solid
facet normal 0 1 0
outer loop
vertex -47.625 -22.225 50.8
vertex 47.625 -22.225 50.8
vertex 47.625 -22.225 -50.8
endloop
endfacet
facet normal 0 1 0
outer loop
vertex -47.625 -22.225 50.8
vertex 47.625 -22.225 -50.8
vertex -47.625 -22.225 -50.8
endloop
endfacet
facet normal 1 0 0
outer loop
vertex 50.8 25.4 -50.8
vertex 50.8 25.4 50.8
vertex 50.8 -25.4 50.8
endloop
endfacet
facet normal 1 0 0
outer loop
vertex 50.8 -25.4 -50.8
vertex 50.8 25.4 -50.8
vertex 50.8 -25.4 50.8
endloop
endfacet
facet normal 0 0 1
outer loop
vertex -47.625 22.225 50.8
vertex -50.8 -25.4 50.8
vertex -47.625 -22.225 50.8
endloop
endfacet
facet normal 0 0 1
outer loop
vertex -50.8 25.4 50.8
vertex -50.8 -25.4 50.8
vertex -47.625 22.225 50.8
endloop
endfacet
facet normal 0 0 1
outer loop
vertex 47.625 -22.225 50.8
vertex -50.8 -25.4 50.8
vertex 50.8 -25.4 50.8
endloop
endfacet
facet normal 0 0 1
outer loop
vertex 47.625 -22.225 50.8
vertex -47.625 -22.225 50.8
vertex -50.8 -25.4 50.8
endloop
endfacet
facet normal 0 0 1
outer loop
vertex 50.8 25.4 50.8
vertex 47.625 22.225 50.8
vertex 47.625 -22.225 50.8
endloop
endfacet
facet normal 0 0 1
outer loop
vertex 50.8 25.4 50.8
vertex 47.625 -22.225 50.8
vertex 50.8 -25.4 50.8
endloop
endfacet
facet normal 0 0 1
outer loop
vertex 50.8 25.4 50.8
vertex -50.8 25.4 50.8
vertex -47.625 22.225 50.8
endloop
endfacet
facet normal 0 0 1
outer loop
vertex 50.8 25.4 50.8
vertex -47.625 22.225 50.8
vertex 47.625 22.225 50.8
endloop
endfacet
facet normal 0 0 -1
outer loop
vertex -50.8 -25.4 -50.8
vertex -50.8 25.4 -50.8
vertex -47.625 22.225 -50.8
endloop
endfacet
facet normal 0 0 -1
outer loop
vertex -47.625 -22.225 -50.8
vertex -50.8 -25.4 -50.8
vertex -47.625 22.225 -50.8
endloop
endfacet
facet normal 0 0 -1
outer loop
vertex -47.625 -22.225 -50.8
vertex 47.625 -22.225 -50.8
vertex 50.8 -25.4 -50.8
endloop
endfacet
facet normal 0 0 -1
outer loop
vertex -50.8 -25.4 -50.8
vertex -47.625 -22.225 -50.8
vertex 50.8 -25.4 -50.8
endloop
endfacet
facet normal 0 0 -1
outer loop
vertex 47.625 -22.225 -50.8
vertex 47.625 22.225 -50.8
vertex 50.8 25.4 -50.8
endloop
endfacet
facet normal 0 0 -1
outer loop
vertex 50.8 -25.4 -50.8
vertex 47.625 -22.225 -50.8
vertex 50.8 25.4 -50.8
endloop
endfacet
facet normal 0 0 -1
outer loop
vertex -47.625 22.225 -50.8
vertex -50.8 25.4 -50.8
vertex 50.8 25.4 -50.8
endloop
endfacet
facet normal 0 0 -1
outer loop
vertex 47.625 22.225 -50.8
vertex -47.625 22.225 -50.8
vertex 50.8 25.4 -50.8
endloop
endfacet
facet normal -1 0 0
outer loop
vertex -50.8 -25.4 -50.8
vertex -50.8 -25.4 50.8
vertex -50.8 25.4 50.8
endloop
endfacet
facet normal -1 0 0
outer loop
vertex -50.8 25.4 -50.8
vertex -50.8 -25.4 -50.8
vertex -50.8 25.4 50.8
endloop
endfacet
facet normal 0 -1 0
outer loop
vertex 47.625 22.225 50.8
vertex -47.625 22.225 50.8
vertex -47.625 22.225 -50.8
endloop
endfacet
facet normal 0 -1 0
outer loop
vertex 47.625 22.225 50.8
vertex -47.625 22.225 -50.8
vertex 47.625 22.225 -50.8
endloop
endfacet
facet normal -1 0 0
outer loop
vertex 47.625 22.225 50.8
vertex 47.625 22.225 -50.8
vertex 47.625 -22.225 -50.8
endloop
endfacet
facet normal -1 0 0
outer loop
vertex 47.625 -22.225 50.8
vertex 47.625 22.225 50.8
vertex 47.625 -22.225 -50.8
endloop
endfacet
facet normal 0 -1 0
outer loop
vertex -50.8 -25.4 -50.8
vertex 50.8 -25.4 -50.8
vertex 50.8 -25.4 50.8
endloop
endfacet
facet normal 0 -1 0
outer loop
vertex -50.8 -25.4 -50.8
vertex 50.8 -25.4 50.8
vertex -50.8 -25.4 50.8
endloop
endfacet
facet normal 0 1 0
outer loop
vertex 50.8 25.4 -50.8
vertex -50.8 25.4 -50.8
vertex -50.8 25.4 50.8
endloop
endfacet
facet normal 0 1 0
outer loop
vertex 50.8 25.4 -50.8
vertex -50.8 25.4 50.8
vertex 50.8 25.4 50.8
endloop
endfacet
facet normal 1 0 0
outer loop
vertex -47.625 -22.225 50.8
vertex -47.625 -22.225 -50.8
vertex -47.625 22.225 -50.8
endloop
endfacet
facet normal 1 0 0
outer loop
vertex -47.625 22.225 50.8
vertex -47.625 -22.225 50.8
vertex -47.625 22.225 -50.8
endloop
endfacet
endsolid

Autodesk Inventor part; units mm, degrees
ref_plane "YZ Plane" through (0, 0, 0) normal (1, 0, 0) x (0, 1, 0)
ref_plane "XZ Plane" through (0, 0, 0) normal (0, 1, 0) x (-1, 0, 0)
ref_plane "XY Plane" through (0, 0, 0) normal (0, 0, 1) x (1, 0, 0)
sketch "Sketch1" plane through (0, 0, 0) normal (0, 0, 1) x (1, 0, 0)
  line L0 (-71.12, 0) -> (71.12, 0) construction
  line L1 (0, -35.56) -> (0, 35.56) construction
  line L2 (-50.8, 25.4) -> (50.8, 25.4)
  line L3 (50.8, 25.4) -> (50.8, -25.4)
  line L4 (50.8, -25.4) -> (-50.8, -25.4)
  line L5 (-50.8, -25.4) -> (-50.8, 25.4)
  line L6 (-47.625, 22.225) -> (47.625, 22.225)
  line L7 (47.625, 22.225) -> (47.625, -22.225)
  line L8 (47.625, -22.225) -> (-47.625, -22.225)
  line L9 (-47.625, -22.225) -> (-47.625, 22.225)
  point P0 (0, 0)
  point P1 (-50.8, 0)
  point P2 (0, 25.4)
  point P3 (-47.625, 0)
  point P4 (0, 22.225)
  dimension "d0" = 50.8
  dimension "d1" = 3.175
  dimension "d11" = 101.6
  dimension "d12" = 3.175
extrude "Extrusion1" add sketch "Sketch1" along normal mid plane 101.6
equation "\"d12\" = d1"
properties part number "Arm 4 inch" material "Aluminum 6061"
